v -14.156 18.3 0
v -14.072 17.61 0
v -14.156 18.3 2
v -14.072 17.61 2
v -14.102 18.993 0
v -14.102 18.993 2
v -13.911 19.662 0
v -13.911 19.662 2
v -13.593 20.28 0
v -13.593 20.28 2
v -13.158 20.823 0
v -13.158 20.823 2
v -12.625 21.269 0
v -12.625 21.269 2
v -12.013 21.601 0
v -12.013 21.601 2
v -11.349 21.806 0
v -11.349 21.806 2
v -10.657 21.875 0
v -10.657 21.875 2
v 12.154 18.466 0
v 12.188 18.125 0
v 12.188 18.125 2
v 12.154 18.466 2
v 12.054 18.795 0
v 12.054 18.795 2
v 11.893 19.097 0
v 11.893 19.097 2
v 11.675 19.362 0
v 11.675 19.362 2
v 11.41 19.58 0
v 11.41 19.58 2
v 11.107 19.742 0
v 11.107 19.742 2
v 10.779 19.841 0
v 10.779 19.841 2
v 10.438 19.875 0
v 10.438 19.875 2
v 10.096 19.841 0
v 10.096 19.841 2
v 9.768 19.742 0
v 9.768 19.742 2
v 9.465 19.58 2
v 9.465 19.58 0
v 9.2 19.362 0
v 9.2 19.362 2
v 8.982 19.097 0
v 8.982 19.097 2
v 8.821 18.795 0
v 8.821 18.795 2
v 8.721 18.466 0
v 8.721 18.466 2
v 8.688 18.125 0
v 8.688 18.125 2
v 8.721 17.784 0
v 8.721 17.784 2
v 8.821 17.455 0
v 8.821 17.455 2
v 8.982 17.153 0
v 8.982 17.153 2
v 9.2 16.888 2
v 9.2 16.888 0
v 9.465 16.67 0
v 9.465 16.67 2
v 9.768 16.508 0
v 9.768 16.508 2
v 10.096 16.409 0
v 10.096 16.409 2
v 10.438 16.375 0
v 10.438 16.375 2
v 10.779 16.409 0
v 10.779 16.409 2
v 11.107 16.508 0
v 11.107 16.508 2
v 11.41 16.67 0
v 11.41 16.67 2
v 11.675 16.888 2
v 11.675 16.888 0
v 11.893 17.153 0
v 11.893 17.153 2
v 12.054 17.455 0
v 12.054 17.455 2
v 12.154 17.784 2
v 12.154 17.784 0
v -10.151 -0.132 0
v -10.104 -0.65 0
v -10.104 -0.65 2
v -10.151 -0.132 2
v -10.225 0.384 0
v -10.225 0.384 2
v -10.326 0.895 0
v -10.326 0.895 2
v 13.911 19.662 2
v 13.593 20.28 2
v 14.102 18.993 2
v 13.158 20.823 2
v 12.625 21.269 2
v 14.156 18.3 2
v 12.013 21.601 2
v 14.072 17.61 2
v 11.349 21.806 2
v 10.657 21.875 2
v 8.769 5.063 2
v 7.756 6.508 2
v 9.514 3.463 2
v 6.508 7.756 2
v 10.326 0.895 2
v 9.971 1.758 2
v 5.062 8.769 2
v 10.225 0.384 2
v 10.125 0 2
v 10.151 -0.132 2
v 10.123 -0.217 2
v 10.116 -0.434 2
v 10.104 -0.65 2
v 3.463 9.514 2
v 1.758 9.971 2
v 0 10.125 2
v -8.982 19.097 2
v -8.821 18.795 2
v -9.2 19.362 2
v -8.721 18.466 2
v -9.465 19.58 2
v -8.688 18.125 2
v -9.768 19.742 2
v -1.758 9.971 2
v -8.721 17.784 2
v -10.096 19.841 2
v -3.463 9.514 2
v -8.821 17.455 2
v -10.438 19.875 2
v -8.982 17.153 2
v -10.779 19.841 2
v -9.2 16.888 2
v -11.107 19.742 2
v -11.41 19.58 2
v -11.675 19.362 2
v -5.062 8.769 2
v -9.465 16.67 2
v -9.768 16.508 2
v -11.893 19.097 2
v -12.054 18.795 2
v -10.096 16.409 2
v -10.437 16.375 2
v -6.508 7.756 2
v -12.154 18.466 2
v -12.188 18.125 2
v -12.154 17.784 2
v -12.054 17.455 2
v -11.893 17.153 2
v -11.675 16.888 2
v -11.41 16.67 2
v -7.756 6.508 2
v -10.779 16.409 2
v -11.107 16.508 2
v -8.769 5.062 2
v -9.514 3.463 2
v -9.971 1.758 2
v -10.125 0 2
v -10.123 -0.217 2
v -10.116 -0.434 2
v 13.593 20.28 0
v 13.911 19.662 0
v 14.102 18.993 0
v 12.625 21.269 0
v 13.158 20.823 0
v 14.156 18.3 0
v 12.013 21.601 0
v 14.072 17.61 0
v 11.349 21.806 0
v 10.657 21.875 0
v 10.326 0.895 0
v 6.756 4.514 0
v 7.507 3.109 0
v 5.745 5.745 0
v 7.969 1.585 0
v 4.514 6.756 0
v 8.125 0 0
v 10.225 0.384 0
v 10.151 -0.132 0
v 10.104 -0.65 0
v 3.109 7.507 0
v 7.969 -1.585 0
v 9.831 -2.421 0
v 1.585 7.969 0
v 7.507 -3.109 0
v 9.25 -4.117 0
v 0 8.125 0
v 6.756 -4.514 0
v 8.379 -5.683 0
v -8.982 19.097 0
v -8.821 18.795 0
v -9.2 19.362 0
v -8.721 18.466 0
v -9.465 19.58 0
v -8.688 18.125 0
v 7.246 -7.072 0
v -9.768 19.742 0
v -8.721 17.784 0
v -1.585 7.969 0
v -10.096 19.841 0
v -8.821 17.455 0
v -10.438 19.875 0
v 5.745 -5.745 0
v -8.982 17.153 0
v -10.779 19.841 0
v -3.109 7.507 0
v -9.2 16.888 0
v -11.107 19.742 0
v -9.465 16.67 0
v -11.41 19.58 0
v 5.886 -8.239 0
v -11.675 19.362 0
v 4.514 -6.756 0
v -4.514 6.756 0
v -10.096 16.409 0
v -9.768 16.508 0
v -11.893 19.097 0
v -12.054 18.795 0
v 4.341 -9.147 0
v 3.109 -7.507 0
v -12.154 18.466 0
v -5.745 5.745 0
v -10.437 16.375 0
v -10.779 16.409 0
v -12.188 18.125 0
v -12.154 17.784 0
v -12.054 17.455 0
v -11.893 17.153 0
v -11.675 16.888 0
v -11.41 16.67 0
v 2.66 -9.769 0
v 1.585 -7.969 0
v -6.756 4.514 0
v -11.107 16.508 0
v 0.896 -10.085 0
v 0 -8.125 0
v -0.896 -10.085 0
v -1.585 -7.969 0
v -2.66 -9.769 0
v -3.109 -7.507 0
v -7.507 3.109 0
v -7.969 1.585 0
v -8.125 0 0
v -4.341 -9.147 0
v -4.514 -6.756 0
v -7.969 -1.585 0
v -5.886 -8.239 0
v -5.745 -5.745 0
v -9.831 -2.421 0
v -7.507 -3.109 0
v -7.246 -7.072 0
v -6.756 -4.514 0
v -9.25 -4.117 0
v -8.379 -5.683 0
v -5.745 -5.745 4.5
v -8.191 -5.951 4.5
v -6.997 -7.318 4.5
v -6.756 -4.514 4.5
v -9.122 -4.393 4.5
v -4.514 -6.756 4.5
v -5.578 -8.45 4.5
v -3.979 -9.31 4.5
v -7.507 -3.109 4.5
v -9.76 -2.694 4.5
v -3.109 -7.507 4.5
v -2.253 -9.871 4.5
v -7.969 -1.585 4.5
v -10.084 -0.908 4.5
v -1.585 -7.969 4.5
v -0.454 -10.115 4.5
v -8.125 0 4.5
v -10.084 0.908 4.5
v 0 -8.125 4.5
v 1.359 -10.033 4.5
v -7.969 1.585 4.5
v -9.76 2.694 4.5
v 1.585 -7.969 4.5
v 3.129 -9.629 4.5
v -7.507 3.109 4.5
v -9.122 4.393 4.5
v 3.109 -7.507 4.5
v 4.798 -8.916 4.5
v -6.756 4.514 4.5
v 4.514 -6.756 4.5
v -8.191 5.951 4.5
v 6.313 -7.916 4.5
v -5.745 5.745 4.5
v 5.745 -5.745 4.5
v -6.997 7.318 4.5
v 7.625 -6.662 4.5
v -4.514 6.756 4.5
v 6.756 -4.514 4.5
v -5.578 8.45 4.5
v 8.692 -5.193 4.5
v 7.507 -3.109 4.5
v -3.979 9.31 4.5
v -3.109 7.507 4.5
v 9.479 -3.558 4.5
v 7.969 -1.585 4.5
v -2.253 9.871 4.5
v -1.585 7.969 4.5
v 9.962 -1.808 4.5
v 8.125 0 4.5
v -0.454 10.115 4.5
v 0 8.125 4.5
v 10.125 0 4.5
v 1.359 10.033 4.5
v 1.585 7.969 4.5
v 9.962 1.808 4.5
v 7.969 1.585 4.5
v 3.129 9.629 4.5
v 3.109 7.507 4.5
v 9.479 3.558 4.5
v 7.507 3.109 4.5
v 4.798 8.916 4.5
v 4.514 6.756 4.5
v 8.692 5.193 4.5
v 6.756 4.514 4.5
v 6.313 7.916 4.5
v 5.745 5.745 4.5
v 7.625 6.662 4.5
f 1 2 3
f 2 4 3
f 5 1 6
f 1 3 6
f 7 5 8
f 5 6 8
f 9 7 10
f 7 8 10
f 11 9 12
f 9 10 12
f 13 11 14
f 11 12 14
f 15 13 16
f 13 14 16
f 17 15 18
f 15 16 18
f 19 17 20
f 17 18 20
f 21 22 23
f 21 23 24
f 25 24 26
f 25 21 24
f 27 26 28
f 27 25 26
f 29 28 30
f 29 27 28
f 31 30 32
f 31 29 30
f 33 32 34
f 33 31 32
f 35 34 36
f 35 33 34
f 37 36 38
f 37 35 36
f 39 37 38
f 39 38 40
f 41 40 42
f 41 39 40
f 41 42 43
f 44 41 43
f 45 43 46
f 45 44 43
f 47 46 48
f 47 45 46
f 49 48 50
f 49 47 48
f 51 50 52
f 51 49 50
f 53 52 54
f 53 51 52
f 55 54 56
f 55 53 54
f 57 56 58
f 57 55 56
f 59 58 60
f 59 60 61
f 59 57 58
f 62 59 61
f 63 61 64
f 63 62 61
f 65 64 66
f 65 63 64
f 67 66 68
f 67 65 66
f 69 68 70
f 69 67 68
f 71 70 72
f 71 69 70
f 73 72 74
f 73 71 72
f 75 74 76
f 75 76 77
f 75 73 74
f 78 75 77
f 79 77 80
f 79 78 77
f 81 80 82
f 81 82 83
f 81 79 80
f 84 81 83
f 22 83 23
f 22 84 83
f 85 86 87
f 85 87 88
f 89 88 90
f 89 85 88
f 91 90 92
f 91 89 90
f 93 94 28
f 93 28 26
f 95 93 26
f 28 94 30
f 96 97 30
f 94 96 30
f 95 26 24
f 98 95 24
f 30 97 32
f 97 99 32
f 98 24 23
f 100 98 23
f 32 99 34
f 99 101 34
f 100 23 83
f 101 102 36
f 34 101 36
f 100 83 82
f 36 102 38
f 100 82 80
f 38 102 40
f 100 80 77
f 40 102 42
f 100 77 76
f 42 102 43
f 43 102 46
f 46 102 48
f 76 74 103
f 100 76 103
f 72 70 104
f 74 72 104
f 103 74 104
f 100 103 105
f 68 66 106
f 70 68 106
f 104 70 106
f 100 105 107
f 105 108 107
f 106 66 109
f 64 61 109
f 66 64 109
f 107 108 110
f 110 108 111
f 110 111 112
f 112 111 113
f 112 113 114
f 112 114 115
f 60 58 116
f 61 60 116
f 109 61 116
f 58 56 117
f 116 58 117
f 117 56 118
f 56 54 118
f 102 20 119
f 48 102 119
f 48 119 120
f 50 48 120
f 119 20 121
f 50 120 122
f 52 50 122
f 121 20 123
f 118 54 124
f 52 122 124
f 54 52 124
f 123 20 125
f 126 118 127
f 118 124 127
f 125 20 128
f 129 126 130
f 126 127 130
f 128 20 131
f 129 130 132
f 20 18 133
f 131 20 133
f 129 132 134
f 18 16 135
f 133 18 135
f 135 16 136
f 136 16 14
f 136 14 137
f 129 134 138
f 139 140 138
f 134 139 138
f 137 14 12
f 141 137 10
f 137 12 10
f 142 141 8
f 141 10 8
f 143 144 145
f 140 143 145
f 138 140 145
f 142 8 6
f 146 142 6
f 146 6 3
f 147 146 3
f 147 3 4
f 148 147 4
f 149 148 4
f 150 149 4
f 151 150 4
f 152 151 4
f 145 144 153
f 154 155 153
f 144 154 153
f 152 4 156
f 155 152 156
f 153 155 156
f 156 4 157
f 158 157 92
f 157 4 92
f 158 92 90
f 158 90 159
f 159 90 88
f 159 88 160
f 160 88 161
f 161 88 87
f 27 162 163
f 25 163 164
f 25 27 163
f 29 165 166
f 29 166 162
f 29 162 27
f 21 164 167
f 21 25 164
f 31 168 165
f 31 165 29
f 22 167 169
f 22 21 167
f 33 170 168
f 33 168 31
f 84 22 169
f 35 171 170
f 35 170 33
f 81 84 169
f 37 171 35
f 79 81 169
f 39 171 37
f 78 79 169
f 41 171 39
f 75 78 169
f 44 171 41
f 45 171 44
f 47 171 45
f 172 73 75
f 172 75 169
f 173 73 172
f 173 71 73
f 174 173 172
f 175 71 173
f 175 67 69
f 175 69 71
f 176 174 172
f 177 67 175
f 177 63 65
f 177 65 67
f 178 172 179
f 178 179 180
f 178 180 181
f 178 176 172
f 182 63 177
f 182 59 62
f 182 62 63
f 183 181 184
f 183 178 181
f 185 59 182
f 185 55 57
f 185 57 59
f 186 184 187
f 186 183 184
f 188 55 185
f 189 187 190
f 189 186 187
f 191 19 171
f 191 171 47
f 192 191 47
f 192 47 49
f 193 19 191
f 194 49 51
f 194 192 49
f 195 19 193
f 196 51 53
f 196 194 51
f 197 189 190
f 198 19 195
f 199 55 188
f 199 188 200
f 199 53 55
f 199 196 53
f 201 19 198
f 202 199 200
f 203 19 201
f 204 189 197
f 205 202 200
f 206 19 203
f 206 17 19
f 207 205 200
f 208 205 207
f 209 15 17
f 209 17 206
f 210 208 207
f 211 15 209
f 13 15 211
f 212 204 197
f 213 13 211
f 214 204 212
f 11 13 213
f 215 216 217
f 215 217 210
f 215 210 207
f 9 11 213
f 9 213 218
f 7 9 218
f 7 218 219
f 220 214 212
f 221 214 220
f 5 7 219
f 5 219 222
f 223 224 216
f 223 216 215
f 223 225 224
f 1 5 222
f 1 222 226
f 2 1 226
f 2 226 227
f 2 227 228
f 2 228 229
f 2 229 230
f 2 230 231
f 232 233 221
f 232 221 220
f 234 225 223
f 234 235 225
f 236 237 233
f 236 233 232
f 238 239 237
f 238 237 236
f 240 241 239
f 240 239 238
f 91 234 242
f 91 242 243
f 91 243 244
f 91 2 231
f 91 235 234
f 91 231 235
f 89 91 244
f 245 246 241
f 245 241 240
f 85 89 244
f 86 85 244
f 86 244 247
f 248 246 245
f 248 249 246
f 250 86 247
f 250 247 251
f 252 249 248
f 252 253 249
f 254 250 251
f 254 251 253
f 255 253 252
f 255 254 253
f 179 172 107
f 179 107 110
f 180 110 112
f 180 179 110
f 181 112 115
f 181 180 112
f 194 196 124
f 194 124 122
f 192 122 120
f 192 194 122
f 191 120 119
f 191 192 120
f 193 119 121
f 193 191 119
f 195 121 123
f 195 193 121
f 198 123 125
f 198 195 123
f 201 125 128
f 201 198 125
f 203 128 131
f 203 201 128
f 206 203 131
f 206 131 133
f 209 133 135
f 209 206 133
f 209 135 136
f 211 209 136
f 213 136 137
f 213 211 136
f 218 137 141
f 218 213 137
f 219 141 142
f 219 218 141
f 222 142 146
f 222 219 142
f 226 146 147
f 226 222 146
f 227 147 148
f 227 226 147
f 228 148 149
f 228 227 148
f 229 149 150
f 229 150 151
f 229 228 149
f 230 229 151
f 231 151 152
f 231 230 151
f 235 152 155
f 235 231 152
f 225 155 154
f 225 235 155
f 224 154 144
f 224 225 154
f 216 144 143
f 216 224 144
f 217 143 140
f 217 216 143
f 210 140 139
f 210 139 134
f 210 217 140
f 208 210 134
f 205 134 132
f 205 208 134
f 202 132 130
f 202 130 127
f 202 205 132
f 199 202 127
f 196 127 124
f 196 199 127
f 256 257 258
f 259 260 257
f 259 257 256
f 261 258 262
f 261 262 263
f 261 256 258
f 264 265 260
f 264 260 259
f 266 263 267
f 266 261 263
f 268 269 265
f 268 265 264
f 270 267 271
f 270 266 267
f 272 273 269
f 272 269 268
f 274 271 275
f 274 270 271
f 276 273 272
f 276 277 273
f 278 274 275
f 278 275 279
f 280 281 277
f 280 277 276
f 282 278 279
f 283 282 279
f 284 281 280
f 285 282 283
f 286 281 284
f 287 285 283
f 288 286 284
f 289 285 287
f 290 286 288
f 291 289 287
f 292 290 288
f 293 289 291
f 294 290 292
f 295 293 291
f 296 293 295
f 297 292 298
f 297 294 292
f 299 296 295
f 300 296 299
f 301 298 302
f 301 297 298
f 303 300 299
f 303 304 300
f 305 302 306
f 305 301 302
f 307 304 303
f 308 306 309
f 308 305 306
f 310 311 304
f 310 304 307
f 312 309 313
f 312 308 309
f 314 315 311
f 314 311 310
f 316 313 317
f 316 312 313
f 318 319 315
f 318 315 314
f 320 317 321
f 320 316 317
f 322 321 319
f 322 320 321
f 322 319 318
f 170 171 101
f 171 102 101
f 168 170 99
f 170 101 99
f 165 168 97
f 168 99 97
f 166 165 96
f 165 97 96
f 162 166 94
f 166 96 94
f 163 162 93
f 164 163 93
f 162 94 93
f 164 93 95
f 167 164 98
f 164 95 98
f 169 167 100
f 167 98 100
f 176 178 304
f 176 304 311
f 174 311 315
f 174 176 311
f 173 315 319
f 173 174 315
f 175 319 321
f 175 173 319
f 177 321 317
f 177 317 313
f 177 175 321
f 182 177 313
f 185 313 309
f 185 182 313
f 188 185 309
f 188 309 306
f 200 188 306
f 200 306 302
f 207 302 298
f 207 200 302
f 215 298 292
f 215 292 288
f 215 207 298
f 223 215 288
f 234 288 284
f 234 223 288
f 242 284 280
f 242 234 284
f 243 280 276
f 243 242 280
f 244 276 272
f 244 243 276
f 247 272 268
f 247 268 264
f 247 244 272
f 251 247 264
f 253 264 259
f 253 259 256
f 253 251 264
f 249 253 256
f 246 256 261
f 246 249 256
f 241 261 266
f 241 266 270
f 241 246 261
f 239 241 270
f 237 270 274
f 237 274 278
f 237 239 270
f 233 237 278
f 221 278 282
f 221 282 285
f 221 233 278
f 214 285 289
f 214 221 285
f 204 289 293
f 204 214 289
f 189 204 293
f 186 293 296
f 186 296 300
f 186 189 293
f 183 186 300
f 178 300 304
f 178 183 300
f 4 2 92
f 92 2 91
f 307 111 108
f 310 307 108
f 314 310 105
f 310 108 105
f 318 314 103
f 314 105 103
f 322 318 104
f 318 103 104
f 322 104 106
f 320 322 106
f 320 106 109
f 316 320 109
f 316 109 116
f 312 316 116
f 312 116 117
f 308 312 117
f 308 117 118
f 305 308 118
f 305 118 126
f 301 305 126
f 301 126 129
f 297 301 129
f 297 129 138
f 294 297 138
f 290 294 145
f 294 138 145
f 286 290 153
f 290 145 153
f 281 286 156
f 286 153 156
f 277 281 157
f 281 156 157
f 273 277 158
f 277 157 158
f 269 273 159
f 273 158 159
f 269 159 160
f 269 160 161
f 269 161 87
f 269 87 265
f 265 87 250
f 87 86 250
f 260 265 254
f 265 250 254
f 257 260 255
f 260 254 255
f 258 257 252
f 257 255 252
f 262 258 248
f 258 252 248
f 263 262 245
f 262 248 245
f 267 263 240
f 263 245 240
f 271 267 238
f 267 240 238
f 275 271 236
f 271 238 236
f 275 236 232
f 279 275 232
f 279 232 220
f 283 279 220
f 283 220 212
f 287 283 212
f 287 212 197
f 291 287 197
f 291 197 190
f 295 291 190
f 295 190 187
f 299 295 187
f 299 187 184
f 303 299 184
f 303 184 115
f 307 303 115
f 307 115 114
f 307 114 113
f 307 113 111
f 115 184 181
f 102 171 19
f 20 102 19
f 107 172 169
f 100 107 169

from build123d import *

# Parameters (mm, degrees)
ESQUISSE1_R        = 10.125
ESQUISSE1_R_2      = 8.125
BOSS_EXTRU_1_DEPTH = 4.5
ESQUISSE1_3_R      = 1.75
BOSS_EXTRU_2_DEPTH = 2
CONG_1_R           = 3.5
CONG_2_R           = 10


with BuildPart() as part:
    # Esquisse1 → Boss.-Extru.1 (new body)
    with BuildSketch(Plane.XY):
        Circle(ESQUISSE1_R)
        Circle(ESQUISSE1_R_2, mode=Mode.SUBTRACT)
    extrude(amount=BOSS_EXTRU_1_DEPTH)

    # Esquisse1<3> → Boss.-Extru.2 (add)
    with BuildSketch(Plane.XY):
        with BuildLine():
            Line((-15.028017241, 21.875), (-10.125, 0))
            ThreePointArc((-10.125, 0), (0, 10.125), (10.125, 0))
            Line((10.125, 0), (15.028017241, 21.875))
            Line((15.028017241, 21.875), (-15.028017241, 21.875))
        make_face()
        with Locations((-10.4375, 18.125)):
            Circle(ESQUISSE1_3_R, mode=Mode.SUBTRACT)
        with Locations((10.4375, 18.125)):
            Circle(ESQUISSE1_3_R, mode=Mode.SUBTRACT)
    extrude(amount=BOSS_EXTRU_2_DEPTH)

    # Congé1
    cong_1_edges = [part.edges().sort_by_distance(p)[0] for p in [
        (15.028017241, 21.875, 1),
        (-15.028017241, 21.875, 1),
    ]]
    fillet(cong_1_edges, radius=CONG_1_R)

    # Congé2
    # the kernel refuses this fillet: 10 mm, written as the material it adds along each edge
    with BuildSketch(Plane(origin=(-10.125, 0, 0), x_dir=(0.03212219246103637, -0.9994839492215452, 0), z_dir=(0, 0, 1))) as cong_2_piece_1:
        with BuildLine():
            CenterArc((0.971696322, -9.994839492), CONG_2_R, 91.840782713, 8.951796508)
            Line((-0.900844579, -0.171724377), (0, 0))
            ThreePointArc((0, 0), (0.325237199, -0.005225014), (0.650474397, 0))
        make_face()
    extrude(amount=2)
    with BuildSketch(Plane(origin=(10.125, 0, 0), x_dir=(0.21871145691738353, 0.9757895770160058, 0), z_dir=(0, 0, 1))) as cong_2_piece_2:
        with BuildLine():
            CenterArc((0.917066092, -10), CONG_2_R, 90, 8.951796508)
            ThreePointArc((-0.638968488, -0.121803991), (-0.318505839, -0.066034587), (0, 0))
            Line((0, 0), (0.917066092, 0))
        make_face()
    extrude(amount=2)


solid = part.part
